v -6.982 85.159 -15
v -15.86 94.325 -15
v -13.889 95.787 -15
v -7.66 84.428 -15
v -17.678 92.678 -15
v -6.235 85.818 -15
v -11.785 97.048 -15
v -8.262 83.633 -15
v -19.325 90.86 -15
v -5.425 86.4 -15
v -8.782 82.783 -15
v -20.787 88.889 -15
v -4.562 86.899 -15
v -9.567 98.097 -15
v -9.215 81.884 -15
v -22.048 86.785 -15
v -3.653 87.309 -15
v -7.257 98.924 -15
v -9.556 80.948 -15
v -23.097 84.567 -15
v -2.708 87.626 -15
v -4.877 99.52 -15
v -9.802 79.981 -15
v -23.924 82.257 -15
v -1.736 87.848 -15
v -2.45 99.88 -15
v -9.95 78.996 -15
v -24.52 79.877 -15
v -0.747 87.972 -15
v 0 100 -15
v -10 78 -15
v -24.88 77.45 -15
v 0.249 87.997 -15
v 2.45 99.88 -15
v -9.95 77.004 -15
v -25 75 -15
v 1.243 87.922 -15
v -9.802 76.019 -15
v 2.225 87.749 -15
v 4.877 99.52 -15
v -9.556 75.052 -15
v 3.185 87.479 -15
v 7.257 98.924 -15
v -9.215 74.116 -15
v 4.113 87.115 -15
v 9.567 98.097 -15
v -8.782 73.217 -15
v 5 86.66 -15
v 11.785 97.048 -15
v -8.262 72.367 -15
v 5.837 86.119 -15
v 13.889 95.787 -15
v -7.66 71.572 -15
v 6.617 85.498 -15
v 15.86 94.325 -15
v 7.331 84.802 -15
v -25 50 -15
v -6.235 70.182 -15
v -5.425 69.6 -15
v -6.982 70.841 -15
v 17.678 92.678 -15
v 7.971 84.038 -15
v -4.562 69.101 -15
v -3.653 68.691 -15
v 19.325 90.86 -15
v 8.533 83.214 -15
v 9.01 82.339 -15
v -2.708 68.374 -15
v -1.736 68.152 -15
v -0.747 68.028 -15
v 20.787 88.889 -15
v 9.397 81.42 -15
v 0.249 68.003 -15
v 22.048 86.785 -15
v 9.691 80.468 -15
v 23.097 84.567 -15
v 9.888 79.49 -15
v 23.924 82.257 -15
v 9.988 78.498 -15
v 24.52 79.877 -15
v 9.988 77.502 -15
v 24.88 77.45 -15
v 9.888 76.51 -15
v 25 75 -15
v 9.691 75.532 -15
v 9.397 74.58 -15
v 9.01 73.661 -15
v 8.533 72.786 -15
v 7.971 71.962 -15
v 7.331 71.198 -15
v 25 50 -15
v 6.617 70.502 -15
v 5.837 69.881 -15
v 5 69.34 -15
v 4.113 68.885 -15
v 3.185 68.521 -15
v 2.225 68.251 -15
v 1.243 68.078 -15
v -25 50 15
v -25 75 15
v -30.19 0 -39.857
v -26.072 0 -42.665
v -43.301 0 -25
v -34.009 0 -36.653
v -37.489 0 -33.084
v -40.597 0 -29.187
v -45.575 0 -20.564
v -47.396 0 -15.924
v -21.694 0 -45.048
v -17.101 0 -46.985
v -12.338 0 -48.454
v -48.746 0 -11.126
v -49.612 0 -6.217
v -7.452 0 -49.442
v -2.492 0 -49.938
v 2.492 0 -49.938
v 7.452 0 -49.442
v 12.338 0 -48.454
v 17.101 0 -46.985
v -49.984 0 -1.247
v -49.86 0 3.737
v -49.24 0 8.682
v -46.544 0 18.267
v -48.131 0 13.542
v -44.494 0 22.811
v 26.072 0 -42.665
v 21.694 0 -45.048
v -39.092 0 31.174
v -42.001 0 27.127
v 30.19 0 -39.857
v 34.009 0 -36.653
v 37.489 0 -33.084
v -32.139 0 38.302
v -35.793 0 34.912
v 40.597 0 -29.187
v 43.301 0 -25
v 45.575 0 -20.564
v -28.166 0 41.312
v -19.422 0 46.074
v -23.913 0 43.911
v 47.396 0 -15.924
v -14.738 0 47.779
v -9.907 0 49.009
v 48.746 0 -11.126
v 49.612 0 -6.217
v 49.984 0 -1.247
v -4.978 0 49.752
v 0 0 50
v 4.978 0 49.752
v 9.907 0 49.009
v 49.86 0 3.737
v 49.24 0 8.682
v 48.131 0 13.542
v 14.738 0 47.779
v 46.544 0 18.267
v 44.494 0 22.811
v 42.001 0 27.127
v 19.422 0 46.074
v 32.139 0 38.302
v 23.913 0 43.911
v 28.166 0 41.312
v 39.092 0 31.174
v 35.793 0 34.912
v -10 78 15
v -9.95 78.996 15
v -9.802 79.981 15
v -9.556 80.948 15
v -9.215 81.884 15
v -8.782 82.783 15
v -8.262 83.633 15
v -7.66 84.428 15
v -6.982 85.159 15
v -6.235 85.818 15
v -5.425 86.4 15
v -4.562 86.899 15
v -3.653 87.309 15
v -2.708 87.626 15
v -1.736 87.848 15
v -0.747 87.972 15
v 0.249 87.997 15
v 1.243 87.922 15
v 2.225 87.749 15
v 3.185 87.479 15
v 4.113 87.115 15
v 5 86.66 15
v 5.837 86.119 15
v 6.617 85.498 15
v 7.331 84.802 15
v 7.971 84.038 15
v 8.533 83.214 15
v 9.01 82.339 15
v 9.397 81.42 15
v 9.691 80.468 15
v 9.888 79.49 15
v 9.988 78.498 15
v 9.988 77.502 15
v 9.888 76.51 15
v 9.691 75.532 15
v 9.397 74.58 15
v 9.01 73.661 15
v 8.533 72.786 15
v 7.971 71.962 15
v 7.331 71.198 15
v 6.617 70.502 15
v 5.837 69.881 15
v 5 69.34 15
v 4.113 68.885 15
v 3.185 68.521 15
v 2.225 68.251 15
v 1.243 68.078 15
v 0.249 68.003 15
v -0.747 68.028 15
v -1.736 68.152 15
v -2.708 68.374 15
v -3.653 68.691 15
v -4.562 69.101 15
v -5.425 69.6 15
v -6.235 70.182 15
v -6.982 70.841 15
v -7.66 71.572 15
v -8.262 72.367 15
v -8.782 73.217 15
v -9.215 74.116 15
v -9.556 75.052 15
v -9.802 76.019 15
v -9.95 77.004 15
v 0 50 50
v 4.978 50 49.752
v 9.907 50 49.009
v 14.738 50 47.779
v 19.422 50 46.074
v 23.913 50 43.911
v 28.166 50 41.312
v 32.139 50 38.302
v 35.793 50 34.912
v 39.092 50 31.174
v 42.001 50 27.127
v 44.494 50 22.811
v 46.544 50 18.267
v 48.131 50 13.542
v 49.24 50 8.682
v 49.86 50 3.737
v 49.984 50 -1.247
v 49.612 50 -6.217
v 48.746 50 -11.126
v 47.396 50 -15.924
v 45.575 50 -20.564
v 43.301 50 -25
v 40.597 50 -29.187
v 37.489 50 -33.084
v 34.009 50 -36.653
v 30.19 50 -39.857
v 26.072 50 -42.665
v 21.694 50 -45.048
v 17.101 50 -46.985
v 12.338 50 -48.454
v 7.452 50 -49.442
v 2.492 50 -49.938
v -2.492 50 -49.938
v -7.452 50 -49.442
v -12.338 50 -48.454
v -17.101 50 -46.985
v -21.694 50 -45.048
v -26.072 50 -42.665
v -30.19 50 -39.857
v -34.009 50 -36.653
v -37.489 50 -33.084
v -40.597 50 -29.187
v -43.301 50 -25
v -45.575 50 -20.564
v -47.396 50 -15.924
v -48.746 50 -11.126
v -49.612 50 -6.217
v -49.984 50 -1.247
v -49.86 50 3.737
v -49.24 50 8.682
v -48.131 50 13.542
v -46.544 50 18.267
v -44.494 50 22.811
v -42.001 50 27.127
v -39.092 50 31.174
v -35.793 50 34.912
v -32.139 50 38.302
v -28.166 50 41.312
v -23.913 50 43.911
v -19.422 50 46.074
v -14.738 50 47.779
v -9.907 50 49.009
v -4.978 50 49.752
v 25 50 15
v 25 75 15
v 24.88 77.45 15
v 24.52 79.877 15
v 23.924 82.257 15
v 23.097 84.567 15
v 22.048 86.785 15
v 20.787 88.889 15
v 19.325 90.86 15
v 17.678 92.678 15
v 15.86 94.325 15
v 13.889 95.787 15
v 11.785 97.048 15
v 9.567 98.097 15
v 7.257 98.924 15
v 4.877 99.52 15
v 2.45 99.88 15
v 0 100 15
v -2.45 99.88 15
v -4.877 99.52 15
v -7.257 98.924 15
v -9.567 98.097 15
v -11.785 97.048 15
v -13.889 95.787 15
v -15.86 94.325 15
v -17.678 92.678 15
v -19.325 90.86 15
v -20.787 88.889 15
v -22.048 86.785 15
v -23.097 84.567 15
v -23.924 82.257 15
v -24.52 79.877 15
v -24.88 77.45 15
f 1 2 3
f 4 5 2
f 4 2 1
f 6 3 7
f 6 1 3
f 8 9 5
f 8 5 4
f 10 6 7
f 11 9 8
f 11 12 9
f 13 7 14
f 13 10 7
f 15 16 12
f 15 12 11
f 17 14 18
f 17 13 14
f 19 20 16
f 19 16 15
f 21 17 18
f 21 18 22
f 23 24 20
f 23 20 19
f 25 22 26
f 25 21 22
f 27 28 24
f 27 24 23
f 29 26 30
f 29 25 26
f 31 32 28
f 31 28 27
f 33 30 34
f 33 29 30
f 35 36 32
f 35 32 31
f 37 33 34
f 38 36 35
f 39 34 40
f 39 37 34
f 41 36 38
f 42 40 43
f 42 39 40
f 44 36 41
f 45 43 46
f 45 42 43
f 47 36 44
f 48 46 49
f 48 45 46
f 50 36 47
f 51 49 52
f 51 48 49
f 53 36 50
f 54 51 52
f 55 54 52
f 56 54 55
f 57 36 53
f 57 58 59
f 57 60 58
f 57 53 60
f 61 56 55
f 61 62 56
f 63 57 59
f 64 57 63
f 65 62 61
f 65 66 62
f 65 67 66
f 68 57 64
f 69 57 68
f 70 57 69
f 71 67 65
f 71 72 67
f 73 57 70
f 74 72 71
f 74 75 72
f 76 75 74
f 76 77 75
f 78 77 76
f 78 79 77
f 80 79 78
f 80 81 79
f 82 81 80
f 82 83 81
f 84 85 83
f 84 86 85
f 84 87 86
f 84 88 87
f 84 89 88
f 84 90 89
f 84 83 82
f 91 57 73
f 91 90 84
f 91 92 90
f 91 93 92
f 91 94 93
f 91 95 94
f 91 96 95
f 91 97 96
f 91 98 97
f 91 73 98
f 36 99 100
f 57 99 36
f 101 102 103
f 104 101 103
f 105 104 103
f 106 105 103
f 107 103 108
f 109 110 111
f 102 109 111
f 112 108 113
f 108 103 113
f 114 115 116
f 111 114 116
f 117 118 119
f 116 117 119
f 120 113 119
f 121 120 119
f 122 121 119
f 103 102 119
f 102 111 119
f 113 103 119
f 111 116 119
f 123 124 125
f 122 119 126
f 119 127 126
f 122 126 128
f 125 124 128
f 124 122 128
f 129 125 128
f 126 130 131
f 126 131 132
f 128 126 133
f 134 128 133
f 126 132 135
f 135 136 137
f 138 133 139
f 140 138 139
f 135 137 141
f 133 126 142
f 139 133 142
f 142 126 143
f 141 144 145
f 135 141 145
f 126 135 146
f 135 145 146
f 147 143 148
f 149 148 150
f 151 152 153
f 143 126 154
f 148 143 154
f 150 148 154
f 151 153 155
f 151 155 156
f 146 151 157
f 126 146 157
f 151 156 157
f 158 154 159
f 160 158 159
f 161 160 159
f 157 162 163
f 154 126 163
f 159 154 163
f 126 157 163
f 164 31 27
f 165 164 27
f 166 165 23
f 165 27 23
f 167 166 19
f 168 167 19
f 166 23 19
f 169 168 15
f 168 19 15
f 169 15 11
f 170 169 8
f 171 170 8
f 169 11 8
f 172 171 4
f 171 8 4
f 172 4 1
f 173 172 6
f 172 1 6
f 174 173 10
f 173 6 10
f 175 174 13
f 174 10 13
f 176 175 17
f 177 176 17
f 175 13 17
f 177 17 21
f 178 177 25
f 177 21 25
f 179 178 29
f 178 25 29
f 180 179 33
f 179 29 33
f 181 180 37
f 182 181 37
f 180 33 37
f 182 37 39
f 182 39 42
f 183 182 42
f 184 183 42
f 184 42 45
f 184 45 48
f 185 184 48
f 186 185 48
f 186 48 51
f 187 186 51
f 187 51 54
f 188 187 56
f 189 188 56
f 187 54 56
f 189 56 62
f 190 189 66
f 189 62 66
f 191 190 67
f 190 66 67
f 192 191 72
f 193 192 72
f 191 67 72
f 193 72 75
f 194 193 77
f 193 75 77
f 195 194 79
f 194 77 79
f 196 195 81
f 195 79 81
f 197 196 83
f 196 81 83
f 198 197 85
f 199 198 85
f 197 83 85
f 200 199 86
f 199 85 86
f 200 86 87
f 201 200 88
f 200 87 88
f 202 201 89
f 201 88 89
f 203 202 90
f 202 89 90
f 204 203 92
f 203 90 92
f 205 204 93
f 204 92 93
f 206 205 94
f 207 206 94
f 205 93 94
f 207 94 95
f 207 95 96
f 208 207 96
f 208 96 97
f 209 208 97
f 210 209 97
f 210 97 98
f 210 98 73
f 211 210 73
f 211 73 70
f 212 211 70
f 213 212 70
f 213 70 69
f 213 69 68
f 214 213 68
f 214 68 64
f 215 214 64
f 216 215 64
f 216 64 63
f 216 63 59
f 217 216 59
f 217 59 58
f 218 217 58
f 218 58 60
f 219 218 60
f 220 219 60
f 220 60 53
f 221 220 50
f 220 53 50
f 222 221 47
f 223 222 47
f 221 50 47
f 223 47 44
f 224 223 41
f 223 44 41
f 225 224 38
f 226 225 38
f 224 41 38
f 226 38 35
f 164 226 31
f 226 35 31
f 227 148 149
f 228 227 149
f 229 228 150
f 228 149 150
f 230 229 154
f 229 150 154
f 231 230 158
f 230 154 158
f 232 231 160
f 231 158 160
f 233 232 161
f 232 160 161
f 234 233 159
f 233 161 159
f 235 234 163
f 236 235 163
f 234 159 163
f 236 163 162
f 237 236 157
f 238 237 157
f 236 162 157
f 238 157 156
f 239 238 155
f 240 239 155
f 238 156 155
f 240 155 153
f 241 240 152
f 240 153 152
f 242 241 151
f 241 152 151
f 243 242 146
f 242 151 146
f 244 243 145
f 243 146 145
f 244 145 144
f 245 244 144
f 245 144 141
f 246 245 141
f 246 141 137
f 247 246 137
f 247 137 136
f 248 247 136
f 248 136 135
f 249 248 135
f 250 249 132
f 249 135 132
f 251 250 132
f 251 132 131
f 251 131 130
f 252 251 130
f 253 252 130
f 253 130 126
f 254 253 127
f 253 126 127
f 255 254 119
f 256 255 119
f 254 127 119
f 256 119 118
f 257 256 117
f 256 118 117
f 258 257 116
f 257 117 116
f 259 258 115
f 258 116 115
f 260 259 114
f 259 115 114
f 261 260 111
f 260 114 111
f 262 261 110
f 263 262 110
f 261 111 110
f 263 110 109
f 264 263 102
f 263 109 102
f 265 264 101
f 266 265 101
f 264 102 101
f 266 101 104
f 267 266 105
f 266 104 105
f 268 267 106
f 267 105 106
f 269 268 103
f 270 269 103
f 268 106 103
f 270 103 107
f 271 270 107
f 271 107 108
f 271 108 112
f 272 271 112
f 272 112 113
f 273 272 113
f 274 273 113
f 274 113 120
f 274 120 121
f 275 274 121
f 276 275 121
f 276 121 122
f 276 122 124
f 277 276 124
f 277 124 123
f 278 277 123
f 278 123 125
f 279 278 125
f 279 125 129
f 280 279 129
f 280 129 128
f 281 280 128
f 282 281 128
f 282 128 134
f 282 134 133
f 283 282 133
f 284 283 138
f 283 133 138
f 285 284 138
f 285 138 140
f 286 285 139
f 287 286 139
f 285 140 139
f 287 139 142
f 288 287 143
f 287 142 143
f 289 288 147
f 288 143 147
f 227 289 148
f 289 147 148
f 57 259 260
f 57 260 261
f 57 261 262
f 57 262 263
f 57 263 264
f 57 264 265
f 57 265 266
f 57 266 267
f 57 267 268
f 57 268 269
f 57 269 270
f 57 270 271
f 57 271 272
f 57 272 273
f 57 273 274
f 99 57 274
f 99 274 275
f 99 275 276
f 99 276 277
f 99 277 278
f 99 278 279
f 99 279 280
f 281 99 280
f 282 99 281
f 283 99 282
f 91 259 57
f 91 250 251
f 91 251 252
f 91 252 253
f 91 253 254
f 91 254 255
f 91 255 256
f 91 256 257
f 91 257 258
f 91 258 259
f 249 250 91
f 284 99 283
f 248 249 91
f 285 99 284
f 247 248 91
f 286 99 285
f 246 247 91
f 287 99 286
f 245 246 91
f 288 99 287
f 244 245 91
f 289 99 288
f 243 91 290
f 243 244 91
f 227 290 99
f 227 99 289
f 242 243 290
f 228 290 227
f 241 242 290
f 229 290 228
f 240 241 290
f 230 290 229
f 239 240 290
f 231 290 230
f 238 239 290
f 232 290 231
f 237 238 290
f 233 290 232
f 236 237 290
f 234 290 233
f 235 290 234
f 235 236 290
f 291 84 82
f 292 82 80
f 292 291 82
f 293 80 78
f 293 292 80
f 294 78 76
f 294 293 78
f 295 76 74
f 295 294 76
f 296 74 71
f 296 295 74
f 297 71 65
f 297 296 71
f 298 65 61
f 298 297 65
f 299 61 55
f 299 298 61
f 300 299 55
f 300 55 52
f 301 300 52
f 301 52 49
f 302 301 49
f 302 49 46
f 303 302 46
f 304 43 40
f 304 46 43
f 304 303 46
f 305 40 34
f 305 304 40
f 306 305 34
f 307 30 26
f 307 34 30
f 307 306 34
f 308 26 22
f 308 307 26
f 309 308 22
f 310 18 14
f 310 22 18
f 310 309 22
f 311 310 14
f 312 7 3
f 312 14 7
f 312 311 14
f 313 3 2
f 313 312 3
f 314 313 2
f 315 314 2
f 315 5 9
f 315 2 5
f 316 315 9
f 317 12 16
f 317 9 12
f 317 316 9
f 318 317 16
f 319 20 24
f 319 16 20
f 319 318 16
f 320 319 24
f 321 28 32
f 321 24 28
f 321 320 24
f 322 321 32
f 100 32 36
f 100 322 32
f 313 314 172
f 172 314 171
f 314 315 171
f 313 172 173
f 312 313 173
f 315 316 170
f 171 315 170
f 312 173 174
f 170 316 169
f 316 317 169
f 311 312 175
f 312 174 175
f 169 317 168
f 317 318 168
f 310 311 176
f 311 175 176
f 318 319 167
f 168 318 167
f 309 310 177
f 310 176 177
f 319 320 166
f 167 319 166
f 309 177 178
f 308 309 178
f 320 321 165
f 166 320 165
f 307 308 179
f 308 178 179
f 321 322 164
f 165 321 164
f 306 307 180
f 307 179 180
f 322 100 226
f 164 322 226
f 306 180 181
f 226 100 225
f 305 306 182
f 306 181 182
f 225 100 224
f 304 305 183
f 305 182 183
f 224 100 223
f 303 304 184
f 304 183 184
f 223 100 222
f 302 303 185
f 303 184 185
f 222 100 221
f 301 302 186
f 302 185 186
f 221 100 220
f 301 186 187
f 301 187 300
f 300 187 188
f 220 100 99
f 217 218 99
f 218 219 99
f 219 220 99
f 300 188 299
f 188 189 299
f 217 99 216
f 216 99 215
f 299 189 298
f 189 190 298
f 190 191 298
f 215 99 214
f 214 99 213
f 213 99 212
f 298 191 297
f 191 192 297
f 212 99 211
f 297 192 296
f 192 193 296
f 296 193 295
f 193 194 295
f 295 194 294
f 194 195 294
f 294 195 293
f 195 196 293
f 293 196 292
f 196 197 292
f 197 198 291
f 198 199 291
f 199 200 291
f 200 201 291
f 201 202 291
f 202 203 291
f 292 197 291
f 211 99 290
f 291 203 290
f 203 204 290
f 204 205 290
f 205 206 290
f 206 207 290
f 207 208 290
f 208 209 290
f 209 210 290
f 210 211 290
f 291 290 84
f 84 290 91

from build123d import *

# Parameters (mm, degrees)
CROQUIS1_R              = 50
SALIENTE_EXTRUIR1_DEPTH = 50
CROQUIS2_W              = 50
CROQUIS2_H              = 30
SALIENTE_EXTRUIR2_DEPTH = 50
CROQUIS3_R              = 10
CORTAR_EXTRUIR1_DEPTH   = 30
REDONDEO1_RADIUS        = 25
REDONDEO1_LENGTH        = 30


with BuildPart() as part:
    # Croquis1 → Saliente-Extruir1 (new body)
    with BuildSketch(Plane(origin=(0, 0, 0), x_dir=(1, 0, 0), z_dir=(0, 1, 0))):
        with Locations(Location((0, 0, 0), (0, 0, 270))):
            Circle(CROQUIS1_R)
    extrude(amount=SALIENTE_EXTRUIR1_DEPTH)

    # Croquis2 → Saliente-Extruir2 (add)
    with BuildSketch(Plane(origin=(0, 50, 0), x_dir=(1, 0, 0), z_dir=(0, 1, 0))):
        Rectangle(CROQUIS2_W, CROQUIS2_H)
    extrude(amount=SALIENTE_EXTRUIR2_DEPTH)

    # Croquis3 → Cortar-Extruir1 (cut)
    with BuildSketch(Plane(origin=(0, 0, -15), x_dir=(-1, 0, 0), z_dir=(0, 0, -1))):
        with Locations((0, 78)):
            Circle(CROQUIS3_R)
    extrude(amount=-CORTAR_EXTRUIR1_DEPTH, mode=Mode.SUBTRACT)

    # Redondeo1: full round fillet: the end face becomes a half cylinder, R = half its width
    redondeo1_face = Plane((0, 100, 0), x_dir=(0, 0, 1), z_dir=(0, 1, 0))  # on the end face: x along it, z out of the body
    redondeo1_slab = redondeo1_face.offset(-REDONDEO1_RADIUS / 2) * Box(REDONDEO1_LENGTH, 2 * REDONDEO1_RADIUS, REDONDEO1_RADIUS, mode=Mode.PRIVATE)  # the body's end, R deep
    redondeo1_round = Plane((0, 75, 0), x_dir=(0, 1, 0), z_dir=(0, 0, 1)) * Cylinder(REDONDEO1_RADIUS, REDONDEO1_LENGTH, mode=Mode.PRIVATE)  # its axis R under the face
    add(redondeo1_slab - redondeo1_round, mode=Mode.SUBTRACT)


solid = part.part
